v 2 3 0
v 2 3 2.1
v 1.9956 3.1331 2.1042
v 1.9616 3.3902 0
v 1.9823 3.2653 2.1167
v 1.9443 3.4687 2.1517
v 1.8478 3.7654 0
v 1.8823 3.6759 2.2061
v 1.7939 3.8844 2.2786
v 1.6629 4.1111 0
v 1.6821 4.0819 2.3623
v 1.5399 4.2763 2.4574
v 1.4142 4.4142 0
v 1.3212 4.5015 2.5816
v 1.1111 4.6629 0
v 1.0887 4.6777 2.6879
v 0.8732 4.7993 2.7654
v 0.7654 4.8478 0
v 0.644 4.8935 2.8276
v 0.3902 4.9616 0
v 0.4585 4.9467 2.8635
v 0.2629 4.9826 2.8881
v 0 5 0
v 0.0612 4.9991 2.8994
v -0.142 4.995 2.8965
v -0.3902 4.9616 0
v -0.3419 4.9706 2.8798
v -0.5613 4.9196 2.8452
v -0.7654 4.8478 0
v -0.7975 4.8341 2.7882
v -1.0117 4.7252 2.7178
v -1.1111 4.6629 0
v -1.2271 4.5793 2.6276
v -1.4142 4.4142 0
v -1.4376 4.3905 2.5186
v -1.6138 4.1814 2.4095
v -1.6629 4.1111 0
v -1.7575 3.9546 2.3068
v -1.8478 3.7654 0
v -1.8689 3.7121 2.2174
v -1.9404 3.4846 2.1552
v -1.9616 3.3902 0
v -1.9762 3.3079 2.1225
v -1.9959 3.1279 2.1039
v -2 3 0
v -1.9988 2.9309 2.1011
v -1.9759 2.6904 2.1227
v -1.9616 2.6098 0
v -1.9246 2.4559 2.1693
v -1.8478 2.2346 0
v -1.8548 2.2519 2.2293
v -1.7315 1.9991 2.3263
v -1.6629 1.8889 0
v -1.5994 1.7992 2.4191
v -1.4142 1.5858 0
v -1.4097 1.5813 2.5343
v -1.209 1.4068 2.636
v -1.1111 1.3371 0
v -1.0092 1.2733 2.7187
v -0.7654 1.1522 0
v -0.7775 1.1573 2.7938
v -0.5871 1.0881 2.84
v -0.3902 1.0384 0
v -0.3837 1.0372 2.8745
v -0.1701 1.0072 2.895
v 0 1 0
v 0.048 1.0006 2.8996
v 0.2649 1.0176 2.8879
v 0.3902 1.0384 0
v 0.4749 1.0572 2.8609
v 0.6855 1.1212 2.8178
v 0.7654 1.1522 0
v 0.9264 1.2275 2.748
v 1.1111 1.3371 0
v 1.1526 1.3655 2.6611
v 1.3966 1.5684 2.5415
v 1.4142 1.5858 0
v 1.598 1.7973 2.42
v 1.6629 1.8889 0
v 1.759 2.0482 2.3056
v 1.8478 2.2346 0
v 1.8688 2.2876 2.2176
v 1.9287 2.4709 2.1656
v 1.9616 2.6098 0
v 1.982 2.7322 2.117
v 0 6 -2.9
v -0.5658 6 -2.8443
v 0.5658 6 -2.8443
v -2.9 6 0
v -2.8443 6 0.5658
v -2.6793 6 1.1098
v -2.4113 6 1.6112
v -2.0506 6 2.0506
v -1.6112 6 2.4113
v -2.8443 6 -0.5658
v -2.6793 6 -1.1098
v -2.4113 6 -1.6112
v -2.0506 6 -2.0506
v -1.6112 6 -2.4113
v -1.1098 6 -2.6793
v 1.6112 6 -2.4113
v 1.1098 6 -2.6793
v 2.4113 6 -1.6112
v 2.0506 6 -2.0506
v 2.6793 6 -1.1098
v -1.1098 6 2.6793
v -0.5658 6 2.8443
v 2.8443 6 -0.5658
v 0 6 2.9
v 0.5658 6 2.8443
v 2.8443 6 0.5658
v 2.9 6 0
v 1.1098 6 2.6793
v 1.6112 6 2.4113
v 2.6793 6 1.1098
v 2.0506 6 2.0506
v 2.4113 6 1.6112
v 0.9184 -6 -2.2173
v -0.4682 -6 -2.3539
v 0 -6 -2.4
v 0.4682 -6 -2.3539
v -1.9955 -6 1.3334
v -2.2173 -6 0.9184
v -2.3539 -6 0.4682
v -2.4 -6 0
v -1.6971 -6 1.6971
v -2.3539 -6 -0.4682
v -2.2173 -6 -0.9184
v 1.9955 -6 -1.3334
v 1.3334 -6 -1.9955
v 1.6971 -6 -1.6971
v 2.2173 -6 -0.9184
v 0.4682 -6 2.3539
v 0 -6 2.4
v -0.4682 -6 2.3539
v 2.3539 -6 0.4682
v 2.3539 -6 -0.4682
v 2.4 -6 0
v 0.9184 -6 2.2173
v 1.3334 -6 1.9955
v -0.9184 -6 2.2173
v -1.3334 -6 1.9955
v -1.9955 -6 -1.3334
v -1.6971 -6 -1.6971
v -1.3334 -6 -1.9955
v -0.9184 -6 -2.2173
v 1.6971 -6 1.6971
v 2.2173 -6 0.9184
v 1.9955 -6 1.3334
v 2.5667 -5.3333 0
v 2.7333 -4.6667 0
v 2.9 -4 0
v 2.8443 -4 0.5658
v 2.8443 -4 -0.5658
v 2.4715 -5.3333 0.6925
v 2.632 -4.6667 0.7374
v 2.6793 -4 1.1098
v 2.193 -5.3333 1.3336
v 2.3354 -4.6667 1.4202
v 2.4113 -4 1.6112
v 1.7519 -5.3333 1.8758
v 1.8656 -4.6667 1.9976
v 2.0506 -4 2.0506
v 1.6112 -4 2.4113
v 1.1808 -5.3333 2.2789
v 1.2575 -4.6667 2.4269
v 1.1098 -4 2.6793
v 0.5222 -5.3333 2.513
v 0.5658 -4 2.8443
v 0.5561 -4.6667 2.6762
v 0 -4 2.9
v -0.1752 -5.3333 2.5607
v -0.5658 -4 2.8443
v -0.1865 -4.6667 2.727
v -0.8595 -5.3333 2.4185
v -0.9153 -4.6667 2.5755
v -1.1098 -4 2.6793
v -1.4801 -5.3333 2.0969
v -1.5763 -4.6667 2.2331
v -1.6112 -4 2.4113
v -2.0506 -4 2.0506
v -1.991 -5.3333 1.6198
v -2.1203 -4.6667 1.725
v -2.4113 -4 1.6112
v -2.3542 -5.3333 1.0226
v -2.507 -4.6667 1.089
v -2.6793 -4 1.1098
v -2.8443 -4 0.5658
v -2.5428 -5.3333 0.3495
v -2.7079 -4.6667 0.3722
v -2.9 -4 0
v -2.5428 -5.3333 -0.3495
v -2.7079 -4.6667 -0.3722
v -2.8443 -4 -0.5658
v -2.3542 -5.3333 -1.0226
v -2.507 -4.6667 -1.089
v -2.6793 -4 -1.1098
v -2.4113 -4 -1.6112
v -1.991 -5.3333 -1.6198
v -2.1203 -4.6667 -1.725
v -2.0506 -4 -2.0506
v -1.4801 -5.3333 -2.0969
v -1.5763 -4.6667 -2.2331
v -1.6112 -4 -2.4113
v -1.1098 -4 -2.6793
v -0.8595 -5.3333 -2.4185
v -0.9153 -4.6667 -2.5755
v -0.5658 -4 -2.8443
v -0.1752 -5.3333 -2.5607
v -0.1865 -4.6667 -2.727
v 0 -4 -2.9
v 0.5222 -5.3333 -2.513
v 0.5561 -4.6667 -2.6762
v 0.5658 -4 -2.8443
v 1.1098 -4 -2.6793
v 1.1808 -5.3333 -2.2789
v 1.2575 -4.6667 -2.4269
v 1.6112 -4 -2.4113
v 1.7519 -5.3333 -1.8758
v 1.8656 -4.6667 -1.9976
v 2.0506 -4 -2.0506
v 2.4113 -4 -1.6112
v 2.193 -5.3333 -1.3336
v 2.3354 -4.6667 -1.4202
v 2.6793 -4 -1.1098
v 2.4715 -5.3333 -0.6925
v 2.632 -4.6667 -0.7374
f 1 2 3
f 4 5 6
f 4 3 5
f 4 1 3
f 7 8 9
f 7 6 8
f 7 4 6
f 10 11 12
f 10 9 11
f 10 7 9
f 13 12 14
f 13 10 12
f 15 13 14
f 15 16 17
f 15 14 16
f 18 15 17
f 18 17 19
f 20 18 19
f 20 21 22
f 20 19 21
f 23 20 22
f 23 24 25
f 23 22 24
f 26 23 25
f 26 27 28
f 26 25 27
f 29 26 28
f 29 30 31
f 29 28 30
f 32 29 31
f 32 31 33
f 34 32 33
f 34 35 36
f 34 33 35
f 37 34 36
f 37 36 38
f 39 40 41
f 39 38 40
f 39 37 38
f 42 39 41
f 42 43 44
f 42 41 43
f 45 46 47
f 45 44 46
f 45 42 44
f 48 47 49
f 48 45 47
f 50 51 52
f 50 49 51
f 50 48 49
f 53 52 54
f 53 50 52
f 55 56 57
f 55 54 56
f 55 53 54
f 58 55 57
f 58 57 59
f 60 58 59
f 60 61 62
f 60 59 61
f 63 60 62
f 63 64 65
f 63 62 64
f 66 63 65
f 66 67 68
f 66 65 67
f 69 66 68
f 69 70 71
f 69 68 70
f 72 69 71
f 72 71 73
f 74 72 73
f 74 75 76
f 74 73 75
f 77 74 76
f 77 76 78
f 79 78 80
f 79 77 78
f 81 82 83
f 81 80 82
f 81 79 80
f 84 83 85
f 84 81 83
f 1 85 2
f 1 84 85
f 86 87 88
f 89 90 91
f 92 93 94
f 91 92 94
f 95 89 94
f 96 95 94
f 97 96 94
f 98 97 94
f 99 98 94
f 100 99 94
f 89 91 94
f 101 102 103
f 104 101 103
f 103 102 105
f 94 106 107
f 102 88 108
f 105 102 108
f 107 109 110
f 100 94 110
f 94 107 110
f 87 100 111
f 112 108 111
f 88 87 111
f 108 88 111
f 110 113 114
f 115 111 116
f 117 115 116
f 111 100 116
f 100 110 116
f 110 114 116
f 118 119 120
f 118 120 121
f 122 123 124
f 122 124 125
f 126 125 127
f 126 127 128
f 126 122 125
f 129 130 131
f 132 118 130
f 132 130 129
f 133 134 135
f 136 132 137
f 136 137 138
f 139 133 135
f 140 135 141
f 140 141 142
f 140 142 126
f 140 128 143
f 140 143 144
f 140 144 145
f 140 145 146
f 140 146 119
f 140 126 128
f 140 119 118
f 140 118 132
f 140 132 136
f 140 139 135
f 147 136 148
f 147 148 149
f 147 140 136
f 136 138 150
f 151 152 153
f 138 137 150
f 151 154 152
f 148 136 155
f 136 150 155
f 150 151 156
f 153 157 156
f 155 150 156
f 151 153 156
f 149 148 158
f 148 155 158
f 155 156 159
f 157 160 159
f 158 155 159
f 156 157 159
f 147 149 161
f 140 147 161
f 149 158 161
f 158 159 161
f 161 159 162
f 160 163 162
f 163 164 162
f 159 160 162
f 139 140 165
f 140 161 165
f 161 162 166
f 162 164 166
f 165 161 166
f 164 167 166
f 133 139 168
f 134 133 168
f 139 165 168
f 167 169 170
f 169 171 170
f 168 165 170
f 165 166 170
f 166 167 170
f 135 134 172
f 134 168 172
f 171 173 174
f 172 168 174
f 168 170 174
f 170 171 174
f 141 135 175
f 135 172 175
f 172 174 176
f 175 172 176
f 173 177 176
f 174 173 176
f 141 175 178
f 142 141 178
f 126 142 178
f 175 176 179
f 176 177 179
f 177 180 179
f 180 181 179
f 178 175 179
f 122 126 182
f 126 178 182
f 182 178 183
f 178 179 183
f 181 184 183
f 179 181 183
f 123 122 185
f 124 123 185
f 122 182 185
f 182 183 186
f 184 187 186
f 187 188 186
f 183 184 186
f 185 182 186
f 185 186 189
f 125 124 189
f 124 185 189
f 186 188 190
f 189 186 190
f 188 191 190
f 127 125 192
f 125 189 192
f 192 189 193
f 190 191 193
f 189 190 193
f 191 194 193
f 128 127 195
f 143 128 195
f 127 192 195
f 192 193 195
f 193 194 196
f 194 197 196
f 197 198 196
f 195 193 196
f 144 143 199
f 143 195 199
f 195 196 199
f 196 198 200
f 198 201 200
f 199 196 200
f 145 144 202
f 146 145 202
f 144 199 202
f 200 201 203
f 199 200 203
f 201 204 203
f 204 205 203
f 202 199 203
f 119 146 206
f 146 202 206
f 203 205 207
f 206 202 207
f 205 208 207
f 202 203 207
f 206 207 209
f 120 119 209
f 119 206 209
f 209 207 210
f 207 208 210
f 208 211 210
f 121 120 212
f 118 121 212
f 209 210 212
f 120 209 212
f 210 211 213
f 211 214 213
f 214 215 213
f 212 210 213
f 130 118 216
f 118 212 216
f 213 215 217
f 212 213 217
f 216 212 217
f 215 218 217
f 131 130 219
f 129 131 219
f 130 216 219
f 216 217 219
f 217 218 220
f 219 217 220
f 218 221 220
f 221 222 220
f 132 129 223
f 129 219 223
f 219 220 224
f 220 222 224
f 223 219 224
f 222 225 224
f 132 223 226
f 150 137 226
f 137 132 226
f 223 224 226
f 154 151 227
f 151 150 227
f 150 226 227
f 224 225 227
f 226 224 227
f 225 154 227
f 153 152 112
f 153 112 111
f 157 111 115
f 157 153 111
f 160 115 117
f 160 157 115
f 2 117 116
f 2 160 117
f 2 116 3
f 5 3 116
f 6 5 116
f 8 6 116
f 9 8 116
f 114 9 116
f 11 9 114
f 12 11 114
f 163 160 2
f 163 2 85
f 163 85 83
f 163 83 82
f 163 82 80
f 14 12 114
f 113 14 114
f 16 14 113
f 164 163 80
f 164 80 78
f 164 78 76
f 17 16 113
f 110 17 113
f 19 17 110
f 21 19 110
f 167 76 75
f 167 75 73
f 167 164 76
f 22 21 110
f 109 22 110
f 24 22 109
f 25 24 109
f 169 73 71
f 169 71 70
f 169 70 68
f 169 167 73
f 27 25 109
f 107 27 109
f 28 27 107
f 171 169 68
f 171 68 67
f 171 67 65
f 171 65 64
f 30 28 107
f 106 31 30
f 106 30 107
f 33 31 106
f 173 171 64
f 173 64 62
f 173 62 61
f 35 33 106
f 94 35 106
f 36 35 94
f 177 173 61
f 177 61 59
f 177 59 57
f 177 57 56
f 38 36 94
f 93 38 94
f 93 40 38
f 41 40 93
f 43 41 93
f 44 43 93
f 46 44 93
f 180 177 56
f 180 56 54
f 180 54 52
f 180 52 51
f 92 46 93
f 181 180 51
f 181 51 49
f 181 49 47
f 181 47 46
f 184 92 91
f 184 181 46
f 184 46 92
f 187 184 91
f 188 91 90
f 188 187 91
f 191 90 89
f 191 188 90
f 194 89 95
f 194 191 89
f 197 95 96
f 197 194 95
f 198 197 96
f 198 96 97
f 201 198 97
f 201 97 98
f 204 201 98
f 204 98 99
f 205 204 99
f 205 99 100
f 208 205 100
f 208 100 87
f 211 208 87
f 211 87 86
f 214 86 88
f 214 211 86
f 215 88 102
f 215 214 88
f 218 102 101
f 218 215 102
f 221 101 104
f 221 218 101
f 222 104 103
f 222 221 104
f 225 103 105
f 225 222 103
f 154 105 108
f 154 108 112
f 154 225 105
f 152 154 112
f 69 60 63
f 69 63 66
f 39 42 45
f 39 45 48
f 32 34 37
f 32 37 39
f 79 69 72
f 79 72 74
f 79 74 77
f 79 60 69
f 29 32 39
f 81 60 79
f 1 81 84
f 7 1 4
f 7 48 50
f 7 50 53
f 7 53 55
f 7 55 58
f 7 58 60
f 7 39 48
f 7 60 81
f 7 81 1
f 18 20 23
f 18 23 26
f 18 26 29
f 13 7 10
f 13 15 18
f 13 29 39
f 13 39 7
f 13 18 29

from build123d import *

# Parameters (mm, degrees)
F0_R     = 2.9
F1_DEPTH = 6
F2_R     = 2
F3_DEPTH = 2.9
F4_SIZE2 = 2
F4_SIZE  = 0.5


with BuildPart() as f1:
    # F0 (on Front) → F1 (new body, symmetric)
    with BuildSketch(Plane.XZ):
        Circle(F0_R)
    extrude(amount=F1_DEPTH, both=True)

    # F2 (on Top) → F3 (cut, through all)
    with BuildSketch(Plane.XY):
        with Locations((0, 3)):
            Circle(F2_R)
    extrude(amount=F3_DEPTH, mode=Mode.SUBTRACT)

    # F4
    f4_edges = [f1.edges().sort_by_distance(p)[0] for p in [
        (-2.9, -6, 0),
    ]]
    f4_side = f1.faces().sort_by_distance((0, -6, 0))[0]
    chamfer(f4_edges, length=F4_SIZE, length2=F4_SIZE2, reference=f4_side)


solid = f1.part
